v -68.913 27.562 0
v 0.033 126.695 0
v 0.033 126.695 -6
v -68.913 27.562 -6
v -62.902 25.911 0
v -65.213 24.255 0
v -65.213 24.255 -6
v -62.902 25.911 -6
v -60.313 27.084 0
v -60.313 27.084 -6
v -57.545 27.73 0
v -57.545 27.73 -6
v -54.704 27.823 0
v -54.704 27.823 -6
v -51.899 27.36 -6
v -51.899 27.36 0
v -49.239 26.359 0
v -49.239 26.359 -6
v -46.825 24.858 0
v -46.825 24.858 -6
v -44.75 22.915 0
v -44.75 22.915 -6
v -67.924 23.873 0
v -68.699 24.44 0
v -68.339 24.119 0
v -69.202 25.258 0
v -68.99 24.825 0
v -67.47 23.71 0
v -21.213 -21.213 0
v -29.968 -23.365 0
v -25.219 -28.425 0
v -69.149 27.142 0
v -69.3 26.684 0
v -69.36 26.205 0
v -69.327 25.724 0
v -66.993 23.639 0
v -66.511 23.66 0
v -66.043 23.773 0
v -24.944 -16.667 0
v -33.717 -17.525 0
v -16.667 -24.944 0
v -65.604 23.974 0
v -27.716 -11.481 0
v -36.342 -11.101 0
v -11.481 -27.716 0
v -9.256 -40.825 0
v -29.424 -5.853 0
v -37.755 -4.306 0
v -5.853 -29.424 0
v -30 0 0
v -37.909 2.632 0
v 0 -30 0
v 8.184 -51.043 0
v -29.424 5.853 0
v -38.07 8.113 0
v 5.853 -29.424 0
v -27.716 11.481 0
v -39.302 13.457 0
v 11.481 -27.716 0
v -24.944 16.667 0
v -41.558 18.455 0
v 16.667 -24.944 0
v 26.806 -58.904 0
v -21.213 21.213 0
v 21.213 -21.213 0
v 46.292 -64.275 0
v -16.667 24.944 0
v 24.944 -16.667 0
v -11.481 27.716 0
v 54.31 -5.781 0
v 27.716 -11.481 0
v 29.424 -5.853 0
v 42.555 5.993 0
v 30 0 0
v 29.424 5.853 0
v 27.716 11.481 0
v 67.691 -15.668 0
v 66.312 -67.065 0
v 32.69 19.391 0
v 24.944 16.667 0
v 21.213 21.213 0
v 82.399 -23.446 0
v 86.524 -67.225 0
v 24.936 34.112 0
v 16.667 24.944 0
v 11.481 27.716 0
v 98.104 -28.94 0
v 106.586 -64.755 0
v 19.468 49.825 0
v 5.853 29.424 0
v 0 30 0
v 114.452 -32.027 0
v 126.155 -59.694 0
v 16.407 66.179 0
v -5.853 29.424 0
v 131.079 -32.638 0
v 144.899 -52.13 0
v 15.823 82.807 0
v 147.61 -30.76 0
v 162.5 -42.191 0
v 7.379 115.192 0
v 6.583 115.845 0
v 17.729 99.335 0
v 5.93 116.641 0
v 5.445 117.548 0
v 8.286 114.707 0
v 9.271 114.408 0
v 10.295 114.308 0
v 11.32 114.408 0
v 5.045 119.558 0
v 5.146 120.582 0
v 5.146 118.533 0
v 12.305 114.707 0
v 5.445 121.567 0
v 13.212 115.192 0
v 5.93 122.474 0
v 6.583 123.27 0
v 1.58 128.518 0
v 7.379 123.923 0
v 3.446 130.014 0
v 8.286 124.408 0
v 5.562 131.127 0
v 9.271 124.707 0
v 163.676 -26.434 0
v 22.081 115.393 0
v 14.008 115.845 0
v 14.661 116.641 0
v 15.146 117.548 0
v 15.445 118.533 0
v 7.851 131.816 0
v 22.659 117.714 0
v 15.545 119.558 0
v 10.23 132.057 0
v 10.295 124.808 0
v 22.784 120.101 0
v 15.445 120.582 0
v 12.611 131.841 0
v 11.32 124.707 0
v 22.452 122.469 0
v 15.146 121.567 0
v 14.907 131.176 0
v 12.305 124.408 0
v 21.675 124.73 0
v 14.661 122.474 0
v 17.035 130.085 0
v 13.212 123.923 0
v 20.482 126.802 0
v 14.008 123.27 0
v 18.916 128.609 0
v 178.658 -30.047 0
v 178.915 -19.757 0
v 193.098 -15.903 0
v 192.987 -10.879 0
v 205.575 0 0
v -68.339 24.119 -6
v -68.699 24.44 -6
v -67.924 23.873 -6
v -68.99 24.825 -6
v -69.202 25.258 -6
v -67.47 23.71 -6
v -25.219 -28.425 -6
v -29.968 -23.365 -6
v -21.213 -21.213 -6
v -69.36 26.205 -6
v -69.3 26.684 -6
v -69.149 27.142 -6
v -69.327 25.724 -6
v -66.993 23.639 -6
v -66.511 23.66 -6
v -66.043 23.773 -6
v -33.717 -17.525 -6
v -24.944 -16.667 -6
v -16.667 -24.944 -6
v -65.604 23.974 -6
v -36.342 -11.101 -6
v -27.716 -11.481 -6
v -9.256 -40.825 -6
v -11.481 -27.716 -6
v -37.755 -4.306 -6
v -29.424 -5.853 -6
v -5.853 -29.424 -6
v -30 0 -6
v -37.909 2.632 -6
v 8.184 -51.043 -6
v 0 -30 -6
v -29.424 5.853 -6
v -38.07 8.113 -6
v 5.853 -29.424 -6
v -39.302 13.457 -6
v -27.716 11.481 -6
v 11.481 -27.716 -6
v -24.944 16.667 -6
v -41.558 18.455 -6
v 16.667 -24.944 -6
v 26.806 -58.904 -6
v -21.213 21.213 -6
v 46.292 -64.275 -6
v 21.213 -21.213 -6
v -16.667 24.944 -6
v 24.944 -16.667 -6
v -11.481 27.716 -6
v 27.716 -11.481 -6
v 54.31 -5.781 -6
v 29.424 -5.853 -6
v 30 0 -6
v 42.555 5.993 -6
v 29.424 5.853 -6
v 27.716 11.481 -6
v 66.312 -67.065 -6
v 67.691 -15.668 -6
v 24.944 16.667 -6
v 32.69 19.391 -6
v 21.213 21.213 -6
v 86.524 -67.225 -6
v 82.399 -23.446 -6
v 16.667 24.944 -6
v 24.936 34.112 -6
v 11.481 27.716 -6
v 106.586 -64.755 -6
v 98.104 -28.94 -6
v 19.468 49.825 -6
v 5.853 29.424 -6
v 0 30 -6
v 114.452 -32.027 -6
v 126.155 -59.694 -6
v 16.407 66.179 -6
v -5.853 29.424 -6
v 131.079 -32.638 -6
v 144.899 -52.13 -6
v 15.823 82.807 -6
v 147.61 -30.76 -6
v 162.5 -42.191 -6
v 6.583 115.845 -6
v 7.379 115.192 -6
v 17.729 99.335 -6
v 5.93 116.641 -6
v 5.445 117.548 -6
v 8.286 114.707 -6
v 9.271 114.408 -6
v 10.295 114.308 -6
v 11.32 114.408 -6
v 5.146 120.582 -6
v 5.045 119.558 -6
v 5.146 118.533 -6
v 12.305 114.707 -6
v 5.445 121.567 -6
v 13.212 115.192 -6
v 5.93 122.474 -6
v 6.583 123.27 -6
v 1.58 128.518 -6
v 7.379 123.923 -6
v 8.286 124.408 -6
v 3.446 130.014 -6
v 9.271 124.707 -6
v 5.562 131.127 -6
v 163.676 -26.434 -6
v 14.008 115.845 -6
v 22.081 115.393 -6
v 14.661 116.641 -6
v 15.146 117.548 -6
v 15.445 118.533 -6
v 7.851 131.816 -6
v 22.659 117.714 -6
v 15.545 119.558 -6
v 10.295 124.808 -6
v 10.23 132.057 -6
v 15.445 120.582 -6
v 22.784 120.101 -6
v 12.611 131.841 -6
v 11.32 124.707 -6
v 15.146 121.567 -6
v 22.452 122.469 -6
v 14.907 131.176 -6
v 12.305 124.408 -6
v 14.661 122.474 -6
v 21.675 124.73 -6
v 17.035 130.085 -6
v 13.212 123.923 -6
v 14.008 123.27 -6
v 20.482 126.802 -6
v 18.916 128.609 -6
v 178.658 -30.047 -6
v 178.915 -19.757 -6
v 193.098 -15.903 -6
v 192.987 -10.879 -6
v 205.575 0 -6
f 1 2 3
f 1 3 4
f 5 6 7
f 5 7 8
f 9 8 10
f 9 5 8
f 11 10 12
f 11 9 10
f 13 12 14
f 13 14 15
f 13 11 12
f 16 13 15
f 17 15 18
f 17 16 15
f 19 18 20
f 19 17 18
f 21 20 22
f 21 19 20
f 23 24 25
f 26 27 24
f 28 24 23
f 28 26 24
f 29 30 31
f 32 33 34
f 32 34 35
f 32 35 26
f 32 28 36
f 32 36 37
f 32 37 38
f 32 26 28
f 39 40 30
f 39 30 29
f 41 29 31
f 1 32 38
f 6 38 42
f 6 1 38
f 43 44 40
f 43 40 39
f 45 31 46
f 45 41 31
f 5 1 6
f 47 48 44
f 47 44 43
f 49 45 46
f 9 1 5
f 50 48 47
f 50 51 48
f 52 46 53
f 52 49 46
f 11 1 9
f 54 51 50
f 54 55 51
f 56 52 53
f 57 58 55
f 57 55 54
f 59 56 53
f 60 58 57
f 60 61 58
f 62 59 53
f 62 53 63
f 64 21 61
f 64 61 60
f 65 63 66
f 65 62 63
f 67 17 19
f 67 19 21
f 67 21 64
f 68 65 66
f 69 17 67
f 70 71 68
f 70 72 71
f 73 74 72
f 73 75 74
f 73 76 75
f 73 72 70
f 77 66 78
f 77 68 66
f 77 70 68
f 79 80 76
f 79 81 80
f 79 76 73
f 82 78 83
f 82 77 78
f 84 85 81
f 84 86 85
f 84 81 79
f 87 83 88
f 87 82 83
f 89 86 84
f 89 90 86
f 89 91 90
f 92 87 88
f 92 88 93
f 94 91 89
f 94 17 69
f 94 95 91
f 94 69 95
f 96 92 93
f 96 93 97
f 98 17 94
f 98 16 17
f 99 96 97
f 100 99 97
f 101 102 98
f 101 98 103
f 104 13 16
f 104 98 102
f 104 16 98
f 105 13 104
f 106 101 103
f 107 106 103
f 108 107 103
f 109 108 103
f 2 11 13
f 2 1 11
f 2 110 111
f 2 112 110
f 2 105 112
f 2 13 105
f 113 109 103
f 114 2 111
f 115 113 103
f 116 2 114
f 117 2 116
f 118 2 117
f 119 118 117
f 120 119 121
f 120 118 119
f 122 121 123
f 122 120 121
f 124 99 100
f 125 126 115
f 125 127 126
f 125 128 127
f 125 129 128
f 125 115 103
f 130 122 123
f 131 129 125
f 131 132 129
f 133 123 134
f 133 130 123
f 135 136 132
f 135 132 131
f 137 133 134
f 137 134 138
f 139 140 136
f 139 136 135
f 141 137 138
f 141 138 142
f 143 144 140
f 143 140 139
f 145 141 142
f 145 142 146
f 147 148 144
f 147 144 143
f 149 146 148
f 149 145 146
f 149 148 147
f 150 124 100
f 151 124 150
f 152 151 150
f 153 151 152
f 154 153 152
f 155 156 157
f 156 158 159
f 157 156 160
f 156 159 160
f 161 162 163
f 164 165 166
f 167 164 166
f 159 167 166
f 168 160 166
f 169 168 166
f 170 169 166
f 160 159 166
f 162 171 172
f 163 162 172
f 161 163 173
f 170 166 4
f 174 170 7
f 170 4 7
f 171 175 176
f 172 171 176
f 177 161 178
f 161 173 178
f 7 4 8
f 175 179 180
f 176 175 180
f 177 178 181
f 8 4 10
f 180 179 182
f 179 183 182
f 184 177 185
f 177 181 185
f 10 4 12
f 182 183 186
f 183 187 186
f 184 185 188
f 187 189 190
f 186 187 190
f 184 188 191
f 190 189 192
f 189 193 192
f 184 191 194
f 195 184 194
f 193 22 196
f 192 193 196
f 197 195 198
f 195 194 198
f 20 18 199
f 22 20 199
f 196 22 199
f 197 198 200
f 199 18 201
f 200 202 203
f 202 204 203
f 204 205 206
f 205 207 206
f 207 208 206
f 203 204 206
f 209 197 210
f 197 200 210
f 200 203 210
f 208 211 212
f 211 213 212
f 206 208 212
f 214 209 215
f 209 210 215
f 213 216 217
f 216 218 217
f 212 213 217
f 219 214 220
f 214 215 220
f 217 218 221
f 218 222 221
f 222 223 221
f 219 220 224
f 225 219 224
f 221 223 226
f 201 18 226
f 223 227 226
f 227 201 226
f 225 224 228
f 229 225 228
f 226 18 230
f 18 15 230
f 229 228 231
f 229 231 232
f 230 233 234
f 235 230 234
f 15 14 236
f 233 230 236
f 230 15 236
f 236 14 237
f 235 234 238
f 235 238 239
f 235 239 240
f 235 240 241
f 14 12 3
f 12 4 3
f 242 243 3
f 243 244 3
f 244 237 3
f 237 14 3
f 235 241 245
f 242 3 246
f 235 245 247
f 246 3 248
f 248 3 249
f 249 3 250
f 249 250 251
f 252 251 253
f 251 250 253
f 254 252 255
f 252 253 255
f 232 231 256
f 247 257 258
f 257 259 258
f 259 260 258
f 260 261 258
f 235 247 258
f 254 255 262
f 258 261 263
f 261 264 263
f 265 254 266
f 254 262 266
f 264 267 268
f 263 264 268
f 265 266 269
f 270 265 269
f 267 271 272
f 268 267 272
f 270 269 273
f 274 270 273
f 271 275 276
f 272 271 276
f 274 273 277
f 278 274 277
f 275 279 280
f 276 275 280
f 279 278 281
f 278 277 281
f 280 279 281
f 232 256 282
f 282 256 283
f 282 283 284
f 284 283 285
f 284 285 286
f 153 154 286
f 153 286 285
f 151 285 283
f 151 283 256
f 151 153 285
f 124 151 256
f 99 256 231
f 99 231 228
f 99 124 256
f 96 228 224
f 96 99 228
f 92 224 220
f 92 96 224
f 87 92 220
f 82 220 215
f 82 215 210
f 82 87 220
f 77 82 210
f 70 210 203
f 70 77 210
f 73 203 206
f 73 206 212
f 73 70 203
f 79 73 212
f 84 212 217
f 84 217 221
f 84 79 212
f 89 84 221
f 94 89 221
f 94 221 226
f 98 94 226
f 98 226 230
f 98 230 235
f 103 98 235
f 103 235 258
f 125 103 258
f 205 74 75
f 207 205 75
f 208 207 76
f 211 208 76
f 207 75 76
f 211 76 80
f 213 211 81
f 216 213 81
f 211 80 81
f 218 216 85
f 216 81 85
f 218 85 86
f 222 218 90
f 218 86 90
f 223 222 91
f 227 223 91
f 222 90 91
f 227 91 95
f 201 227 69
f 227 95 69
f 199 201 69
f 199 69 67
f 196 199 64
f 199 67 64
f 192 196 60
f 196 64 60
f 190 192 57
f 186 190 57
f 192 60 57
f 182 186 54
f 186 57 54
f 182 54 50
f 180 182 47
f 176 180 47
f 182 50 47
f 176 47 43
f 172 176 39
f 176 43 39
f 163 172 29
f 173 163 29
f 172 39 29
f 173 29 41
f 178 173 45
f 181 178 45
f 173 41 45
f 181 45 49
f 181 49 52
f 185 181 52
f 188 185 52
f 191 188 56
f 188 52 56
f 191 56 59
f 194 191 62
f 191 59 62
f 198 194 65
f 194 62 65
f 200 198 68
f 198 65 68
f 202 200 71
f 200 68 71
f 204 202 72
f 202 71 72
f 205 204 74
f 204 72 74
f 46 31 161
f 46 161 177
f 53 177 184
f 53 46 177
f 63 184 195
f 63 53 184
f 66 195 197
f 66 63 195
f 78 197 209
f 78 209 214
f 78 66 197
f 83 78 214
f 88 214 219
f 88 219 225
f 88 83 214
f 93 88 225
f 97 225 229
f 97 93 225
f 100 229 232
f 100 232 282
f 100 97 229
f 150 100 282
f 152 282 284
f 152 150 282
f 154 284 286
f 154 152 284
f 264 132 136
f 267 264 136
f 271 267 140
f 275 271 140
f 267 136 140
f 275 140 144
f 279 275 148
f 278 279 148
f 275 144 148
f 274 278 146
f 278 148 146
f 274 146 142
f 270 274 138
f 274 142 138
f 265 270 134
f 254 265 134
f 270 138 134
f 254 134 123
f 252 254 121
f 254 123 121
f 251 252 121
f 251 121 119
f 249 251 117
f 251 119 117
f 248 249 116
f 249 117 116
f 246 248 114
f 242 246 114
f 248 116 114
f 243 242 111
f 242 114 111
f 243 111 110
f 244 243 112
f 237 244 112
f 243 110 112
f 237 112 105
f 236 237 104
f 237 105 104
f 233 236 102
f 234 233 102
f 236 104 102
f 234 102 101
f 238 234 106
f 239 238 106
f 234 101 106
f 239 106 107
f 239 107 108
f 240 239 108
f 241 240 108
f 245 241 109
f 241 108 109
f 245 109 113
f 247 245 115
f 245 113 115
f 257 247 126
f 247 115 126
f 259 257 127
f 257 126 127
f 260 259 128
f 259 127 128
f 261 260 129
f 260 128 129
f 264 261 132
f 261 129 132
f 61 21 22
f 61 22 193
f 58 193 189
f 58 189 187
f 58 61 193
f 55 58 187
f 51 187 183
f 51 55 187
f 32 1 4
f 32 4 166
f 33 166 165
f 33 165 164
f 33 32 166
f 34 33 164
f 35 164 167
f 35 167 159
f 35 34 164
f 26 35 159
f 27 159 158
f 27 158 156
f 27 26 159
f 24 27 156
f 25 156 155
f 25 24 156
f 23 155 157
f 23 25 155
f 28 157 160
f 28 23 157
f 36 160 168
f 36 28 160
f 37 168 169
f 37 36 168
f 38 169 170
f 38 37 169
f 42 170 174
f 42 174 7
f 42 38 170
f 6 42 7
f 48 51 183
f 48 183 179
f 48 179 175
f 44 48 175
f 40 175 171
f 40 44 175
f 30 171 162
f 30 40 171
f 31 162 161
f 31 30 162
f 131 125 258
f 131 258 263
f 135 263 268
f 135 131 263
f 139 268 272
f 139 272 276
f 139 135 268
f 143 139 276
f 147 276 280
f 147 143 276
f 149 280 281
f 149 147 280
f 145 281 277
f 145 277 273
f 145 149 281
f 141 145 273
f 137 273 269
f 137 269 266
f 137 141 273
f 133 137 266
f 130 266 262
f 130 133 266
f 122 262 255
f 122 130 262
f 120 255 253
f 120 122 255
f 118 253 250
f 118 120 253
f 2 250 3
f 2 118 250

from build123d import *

# Parameters (mm, degrees)
SKETCH_1_R             = 5.25
SKETCH_1_R_2           = 30
SM_BASE_FLANGE_1_DEPTH = 6


# Sheet-metal steps are written as plain solids
with BuildPart() as part:
    # Sketch 1 → Базовая кромка1 (new body)
    with BuildSketch(Plane.XY):
        with BuildLine():
            Line((0.033417561, 126.694802442), (-68.913342264, 27.562479168))
            ThreePointArc((-68.913342264, 27.562479168), (-68.526745087, 24.270869385), (-65.212546165, 24.255447089))
            ThreePointArc((-65.212546165, 24.255447089), (-54.703732736, 27.822860554), (-44.750337246, 22.914549568))
            ThreePointArc((-44.750337246, 22.914549568), (-39.302081877, 13.457030285), (-37.908757817, 2.63174481))
            ThreePointArc((-37.908757817, 2.63174481), (-35.176905519, -14.373076153), (-25.219001767, -28.425375105))
            ThreePointArc((-25.219001767, -28.425375105), (96.595176943, -66.317354816), (205.574554402, 0))
            ThreePointArc((205.574554402, 0), (67.691260765, -15.667826508), (22.08143844, 115.393333105))
            ThreePointArc((22.08143844, 115.393333105), (15.997331025, 130.681317743), (0.033417561, 126.694802442))
        make_face()
        with Locations((10.295453487, 119.557532751)):
            Circle(SKETCH_1_R, mode=Mode.SUBTRACT)
        Circle(SKETCH_1_R_2, mode=Mode.SUBTRACT)
    extrude(amount=-SM_BASE_FLANGE_1_DEPTH)


solid = part.part
